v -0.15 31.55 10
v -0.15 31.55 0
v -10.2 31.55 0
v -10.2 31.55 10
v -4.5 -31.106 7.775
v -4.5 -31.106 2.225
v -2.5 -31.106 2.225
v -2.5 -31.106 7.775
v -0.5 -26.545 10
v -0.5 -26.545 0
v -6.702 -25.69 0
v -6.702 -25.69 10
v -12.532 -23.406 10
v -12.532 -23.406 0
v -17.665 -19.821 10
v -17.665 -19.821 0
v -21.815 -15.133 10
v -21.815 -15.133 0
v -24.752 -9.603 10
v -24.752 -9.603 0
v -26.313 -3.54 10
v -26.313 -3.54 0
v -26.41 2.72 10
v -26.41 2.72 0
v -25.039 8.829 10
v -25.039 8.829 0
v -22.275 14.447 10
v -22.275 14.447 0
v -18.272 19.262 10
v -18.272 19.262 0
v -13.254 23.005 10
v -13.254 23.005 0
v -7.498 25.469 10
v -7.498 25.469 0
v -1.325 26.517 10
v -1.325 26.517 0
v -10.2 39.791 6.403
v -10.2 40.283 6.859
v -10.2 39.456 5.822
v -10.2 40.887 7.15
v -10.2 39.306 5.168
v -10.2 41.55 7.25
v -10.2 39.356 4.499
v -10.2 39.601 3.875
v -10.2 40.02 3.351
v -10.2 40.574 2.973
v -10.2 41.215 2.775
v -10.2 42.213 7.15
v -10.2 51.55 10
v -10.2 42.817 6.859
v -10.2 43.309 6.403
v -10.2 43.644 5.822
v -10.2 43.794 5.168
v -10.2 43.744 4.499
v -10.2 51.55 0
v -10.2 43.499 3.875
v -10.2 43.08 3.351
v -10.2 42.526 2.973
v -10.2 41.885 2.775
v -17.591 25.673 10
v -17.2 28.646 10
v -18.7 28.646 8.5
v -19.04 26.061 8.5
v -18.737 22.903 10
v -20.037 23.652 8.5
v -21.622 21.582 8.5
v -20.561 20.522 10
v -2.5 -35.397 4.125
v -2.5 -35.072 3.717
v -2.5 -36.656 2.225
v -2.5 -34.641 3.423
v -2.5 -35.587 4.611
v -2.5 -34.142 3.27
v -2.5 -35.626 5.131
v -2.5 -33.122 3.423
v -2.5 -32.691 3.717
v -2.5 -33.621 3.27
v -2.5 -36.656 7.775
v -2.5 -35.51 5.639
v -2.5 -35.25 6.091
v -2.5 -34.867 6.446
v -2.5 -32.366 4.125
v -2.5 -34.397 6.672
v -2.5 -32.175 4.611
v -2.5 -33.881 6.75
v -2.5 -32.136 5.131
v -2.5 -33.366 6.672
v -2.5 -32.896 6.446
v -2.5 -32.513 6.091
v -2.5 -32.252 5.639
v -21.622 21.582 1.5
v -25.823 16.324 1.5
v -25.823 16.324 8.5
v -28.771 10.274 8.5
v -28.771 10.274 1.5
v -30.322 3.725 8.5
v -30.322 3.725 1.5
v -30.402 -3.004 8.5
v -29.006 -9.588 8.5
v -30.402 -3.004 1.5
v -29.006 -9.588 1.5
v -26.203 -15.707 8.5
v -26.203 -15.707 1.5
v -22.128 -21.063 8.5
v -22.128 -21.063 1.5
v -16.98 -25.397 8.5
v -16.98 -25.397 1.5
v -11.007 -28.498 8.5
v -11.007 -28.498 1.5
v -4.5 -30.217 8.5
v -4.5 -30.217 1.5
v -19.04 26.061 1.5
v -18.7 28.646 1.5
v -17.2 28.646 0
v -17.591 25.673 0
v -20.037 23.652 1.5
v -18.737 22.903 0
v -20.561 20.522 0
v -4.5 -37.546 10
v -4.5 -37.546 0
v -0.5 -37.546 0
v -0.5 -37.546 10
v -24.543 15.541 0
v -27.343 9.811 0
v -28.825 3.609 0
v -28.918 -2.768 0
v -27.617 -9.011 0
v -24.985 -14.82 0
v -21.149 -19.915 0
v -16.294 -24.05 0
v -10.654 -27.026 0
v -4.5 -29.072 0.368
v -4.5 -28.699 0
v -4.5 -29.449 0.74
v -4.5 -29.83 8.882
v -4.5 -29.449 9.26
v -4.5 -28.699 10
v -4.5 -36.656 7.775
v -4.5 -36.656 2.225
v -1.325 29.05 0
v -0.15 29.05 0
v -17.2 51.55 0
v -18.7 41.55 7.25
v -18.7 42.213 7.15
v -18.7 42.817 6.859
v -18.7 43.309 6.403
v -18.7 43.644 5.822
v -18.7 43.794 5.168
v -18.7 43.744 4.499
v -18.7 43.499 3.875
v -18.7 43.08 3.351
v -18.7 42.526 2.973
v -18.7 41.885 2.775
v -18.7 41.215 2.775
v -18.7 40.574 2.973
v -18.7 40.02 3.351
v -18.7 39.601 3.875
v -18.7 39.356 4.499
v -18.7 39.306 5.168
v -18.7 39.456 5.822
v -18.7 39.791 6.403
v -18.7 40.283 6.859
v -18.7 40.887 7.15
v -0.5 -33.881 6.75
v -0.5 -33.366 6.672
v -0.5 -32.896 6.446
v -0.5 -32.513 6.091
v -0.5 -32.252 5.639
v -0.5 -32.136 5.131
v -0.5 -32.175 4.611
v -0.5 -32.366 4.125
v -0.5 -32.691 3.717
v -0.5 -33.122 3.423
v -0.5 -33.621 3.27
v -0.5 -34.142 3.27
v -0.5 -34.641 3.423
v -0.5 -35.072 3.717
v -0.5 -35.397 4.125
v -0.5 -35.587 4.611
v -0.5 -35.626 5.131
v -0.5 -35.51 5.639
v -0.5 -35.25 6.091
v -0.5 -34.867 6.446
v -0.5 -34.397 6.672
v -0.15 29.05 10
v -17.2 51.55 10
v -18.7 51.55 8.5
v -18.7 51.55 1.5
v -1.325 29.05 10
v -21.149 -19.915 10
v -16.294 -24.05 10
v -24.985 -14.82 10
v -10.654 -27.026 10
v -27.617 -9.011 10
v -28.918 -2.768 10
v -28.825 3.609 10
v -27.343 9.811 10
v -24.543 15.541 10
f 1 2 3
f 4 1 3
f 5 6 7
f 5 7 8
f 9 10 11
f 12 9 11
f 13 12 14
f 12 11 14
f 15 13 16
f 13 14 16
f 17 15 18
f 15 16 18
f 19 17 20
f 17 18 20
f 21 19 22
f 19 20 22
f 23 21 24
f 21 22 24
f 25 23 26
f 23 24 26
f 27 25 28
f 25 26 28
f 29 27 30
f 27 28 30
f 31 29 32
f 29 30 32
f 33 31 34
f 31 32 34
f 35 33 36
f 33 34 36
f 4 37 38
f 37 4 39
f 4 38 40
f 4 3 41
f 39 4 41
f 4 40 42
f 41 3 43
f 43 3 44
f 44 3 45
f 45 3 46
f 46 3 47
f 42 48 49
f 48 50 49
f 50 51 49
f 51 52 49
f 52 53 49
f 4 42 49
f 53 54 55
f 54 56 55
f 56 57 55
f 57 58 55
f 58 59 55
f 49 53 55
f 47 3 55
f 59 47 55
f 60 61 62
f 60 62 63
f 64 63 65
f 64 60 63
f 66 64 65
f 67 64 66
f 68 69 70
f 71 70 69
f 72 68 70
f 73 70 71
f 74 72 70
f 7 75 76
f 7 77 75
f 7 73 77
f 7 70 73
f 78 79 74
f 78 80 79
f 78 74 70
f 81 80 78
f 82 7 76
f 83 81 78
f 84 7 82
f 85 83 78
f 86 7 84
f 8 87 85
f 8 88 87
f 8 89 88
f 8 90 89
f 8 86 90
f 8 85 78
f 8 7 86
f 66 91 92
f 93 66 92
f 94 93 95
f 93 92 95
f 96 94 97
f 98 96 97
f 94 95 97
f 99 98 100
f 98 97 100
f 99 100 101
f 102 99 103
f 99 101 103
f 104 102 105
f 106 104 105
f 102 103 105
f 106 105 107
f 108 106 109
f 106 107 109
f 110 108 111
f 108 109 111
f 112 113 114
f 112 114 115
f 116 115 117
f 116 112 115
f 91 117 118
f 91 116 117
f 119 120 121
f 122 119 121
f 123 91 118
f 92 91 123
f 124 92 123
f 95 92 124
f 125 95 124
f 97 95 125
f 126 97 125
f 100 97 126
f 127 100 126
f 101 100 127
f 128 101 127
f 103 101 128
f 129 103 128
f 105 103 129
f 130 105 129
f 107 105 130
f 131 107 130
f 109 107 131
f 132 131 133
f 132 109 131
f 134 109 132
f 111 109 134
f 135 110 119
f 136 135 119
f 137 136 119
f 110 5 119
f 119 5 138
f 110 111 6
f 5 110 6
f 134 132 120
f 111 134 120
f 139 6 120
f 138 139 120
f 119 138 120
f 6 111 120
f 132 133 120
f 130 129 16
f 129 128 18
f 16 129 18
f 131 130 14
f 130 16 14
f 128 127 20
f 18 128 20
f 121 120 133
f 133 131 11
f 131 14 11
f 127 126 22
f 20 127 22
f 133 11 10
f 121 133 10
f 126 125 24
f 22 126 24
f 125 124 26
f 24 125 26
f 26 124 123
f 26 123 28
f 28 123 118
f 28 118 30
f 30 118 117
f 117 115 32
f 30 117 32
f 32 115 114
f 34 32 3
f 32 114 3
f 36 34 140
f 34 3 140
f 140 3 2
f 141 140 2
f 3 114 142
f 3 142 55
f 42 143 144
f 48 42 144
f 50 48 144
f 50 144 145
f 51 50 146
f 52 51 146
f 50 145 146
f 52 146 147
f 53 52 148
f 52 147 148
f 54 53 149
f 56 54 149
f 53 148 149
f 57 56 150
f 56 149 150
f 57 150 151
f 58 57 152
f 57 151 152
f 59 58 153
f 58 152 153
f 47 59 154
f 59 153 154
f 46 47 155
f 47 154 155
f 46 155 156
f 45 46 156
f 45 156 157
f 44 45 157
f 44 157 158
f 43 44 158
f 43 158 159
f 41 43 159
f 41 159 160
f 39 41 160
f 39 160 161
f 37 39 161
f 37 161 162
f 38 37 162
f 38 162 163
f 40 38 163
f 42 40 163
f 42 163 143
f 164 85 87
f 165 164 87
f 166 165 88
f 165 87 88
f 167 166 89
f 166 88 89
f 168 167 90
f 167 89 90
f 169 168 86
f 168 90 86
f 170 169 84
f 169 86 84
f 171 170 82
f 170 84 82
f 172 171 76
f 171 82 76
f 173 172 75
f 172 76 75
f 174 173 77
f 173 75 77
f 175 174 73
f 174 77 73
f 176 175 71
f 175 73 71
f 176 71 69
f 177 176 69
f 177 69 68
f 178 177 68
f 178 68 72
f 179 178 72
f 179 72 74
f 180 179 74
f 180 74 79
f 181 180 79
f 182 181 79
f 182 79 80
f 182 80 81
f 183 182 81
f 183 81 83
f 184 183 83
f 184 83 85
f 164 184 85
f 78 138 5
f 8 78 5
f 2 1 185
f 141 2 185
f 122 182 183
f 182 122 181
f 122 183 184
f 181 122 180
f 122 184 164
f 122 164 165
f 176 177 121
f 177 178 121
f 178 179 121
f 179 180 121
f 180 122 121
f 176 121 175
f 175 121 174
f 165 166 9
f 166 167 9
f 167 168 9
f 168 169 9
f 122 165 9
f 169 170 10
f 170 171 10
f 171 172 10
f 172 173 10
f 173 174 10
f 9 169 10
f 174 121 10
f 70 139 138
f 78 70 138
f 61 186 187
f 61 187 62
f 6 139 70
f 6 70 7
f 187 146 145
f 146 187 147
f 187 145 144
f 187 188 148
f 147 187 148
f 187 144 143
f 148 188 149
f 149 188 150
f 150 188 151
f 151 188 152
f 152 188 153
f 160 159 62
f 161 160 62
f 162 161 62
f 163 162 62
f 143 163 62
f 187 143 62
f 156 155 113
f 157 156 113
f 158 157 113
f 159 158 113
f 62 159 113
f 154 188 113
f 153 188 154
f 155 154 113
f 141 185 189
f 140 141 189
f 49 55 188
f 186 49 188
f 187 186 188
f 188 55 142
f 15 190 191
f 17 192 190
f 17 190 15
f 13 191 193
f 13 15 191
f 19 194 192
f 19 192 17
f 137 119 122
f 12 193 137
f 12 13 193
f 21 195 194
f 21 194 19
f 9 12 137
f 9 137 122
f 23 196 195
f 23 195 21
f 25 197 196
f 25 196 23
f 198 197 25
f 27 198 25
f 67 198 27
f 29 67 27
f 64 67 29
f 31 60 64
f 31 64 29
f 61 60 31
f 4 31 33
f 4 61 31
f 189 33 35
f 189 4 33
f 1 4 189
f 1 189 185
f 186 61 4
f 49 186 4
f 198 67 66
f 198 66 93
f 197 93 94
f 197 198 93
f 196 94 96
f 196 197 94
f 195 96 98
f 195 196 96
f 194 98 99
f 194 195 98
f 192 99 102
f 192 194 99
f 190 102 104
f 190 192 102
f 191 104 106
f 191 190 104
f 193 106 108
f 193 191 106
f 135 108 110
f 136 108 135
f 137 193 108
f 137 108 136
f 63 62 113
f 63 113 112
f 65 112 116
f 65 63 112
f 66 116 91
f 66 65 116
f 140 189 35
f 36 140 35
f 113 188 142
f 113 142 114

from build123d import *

# Parameters (mm, degrees)
AUFSATZ_LINEAR_AUSTRAGEN1_DEPTH = 10
SKIZZE2_R                       = 1.75
SCHNITT_LINEAR_AUSTRAGEN1_DEPTH = 36.05
SKIZZE4_R                       = 2.25
SCHNITT_LINEAR_AUSTRAGEN3_DEPTH = 50.25
VERRUNDUNG1_R                   = 10
SKIZZE5_W                       = 5.55
SKIZZE5_H                       = 5.55
SCHNITT_LINEAR_AUSTRAGEN4_DEPTH = 2
SCHNITT_LINEAR_AUSTRAGEN5_DEPTH = 11
FASE1_SIZE                      = 1.5
SCHNITT_LINEAR_AUSTRAGEN6_DEPTH = 11


with BuildPart() as part:
    # Skizze1 → Aufsatz-Linear austragen1 (new body)
    with BuildSketch(Plane.XY):
        with BuildLine():
            Line((0.5, -26.545291485), (0.5, -30.545908073))
            Line((0.5, -30.545908073), (0.5, -37.545908073))
            Line((0.5, -37.545908073), (4.5, -37.545908073))
            Line((4.5, -37.545908073), (4.5, -30.216758595))
            ThreePointArc((4.5, -30.216758595), (29.558680329, -7.719256261), (18.7, 24.158073185))
            Line((18.7, 24.158073185), (18.7, 51.55))
            Line((18.7, 51.55), (10.2, 51.55))
            Line((10.2, 51.55), (10.2, 31.55))
            Line((10.2, 31.55), (-10.2, 31.55))
            Line((-10.2, 31.55), (-10.2, 51.55))
            Line((-10.2, 51.55), (-18.7, 51.55))
            Line((-18.7, 51.55), (-18.7, 24.158073185))
            ThreePointArc((-18.7, 24.158073185), (-29.558680329, -7.719256261), (-4.5, -30.216758595))
            Line((-4.5, -30.216758595), (-4.5, -37.545908073))
            Line((-4.5, -37.545908073), (-0.5, -37.545908073))
            Line((-0.5, -37.545908073), (-0.5, -30.545908073))
            Line((-0.5, -30.545908073), (-0.5, -26.545291485))
            ThreePointArc((-0.5, -26.545291485), (0, 26.55), (0.5, -26.545291485))
        make_face()
    extrude(amount=AUFSATZ_LINEAR_AUSTRAGEN1_DEPTH)

    # Skizze2 → Schnitt-Linear austragen1 (cut, through all)
    with BuildSketch(Plane.ZY.offset(4.5)):
        with Locations((5, -33.881333334)):
            Circle(SKIZZE2_R)
    extrude(amount=-SCHNITT_LINEAR_AUSTRAGEN1_DEPTH, mode=Mode.SUBTRACT)

    # Skizze4 → Schnitt-Linear austragen3 (cut, through all)
    with BuildSketch(Plane.ZY.offset(18.7)):
        with Locations((5, 41.55)):
            Circle(SKIZZE4_R)
    extrude(amount=-SCHNITT_LINEAR_AUSTRAGEN3_DEPTH, mode=Mode.SUBTRACT)

    # Verrundung1
    verrundung1_edges = [part.edges().sort_by_distance(p)[0] for p in [
        (-18.7, 24.158073185, 5),
        (18.7, 24.158073185, 5),
    ]]
    fillet(verrundung1_edges, radius=VERRUNDUNG1_R)

    # Skizze5 → Schnitt-Linear austragen4 (cut)
    with BuildSketch(Plane.ZY.offset(4.5)):
        with Locations((5, -33.881333334)):
            Rectangle(SKIZZE5_W, SKIZZE5_H)
    extrude(amount=-SCHNITT_LINEAR_AUSTRAGEN4_DEPTH, mode=Mode.SUBTRACT)

    # Skizze6 → Schnitt-Linear austragen5 (cut, through all)
    with BuildSketch(Plane.XY):
        Polygon((0, 0), (0, 63.91348789), (40.013946788, 63.91348789), (48.360414216, -54.819102682), (0, -54.819102682), align=None)
    extrude(amount=SCHNITT_LINEAR_AUSTRAGEN5_DEPTH, mode=Mode.SUBTRACT)

    # Fase1
    fase1_edges = [part.edges().sort_by_distance(p)[0] for p in [
        (-18.7, 40.098167422, 0),
        (-18.7, 40.098167422, 10),
        (-29.006358008, -9.588206043, 0),
        (-29.006358008, -9.588206043, 10),
        (-19.459415096, 24.823823807, 0),
        (-19.459415096, 24.823823807, 10),
    ]]
    chamfer(fase1_edges, length=FASE1_SIZE)

    # Skizze7 → Schnitt-Linear austragen6 (cut, through all)
    with BuildSketch(Plane.XY.offset(10)):
        Polygon((1.325, 29.05), (0, 29.05), (0, 31.55), (-0.15, 31.55), (-0.15, 29.05), (-1.325, 29.05), (-1.325, 23.522445011), (1.325, 23.522445011), align=None)
    extrude(amount=-SCHNITT_LINEAR_AUSTRAGEN6_DEPTH, mode=Mode.SUBTRACT)


solid = part.part
